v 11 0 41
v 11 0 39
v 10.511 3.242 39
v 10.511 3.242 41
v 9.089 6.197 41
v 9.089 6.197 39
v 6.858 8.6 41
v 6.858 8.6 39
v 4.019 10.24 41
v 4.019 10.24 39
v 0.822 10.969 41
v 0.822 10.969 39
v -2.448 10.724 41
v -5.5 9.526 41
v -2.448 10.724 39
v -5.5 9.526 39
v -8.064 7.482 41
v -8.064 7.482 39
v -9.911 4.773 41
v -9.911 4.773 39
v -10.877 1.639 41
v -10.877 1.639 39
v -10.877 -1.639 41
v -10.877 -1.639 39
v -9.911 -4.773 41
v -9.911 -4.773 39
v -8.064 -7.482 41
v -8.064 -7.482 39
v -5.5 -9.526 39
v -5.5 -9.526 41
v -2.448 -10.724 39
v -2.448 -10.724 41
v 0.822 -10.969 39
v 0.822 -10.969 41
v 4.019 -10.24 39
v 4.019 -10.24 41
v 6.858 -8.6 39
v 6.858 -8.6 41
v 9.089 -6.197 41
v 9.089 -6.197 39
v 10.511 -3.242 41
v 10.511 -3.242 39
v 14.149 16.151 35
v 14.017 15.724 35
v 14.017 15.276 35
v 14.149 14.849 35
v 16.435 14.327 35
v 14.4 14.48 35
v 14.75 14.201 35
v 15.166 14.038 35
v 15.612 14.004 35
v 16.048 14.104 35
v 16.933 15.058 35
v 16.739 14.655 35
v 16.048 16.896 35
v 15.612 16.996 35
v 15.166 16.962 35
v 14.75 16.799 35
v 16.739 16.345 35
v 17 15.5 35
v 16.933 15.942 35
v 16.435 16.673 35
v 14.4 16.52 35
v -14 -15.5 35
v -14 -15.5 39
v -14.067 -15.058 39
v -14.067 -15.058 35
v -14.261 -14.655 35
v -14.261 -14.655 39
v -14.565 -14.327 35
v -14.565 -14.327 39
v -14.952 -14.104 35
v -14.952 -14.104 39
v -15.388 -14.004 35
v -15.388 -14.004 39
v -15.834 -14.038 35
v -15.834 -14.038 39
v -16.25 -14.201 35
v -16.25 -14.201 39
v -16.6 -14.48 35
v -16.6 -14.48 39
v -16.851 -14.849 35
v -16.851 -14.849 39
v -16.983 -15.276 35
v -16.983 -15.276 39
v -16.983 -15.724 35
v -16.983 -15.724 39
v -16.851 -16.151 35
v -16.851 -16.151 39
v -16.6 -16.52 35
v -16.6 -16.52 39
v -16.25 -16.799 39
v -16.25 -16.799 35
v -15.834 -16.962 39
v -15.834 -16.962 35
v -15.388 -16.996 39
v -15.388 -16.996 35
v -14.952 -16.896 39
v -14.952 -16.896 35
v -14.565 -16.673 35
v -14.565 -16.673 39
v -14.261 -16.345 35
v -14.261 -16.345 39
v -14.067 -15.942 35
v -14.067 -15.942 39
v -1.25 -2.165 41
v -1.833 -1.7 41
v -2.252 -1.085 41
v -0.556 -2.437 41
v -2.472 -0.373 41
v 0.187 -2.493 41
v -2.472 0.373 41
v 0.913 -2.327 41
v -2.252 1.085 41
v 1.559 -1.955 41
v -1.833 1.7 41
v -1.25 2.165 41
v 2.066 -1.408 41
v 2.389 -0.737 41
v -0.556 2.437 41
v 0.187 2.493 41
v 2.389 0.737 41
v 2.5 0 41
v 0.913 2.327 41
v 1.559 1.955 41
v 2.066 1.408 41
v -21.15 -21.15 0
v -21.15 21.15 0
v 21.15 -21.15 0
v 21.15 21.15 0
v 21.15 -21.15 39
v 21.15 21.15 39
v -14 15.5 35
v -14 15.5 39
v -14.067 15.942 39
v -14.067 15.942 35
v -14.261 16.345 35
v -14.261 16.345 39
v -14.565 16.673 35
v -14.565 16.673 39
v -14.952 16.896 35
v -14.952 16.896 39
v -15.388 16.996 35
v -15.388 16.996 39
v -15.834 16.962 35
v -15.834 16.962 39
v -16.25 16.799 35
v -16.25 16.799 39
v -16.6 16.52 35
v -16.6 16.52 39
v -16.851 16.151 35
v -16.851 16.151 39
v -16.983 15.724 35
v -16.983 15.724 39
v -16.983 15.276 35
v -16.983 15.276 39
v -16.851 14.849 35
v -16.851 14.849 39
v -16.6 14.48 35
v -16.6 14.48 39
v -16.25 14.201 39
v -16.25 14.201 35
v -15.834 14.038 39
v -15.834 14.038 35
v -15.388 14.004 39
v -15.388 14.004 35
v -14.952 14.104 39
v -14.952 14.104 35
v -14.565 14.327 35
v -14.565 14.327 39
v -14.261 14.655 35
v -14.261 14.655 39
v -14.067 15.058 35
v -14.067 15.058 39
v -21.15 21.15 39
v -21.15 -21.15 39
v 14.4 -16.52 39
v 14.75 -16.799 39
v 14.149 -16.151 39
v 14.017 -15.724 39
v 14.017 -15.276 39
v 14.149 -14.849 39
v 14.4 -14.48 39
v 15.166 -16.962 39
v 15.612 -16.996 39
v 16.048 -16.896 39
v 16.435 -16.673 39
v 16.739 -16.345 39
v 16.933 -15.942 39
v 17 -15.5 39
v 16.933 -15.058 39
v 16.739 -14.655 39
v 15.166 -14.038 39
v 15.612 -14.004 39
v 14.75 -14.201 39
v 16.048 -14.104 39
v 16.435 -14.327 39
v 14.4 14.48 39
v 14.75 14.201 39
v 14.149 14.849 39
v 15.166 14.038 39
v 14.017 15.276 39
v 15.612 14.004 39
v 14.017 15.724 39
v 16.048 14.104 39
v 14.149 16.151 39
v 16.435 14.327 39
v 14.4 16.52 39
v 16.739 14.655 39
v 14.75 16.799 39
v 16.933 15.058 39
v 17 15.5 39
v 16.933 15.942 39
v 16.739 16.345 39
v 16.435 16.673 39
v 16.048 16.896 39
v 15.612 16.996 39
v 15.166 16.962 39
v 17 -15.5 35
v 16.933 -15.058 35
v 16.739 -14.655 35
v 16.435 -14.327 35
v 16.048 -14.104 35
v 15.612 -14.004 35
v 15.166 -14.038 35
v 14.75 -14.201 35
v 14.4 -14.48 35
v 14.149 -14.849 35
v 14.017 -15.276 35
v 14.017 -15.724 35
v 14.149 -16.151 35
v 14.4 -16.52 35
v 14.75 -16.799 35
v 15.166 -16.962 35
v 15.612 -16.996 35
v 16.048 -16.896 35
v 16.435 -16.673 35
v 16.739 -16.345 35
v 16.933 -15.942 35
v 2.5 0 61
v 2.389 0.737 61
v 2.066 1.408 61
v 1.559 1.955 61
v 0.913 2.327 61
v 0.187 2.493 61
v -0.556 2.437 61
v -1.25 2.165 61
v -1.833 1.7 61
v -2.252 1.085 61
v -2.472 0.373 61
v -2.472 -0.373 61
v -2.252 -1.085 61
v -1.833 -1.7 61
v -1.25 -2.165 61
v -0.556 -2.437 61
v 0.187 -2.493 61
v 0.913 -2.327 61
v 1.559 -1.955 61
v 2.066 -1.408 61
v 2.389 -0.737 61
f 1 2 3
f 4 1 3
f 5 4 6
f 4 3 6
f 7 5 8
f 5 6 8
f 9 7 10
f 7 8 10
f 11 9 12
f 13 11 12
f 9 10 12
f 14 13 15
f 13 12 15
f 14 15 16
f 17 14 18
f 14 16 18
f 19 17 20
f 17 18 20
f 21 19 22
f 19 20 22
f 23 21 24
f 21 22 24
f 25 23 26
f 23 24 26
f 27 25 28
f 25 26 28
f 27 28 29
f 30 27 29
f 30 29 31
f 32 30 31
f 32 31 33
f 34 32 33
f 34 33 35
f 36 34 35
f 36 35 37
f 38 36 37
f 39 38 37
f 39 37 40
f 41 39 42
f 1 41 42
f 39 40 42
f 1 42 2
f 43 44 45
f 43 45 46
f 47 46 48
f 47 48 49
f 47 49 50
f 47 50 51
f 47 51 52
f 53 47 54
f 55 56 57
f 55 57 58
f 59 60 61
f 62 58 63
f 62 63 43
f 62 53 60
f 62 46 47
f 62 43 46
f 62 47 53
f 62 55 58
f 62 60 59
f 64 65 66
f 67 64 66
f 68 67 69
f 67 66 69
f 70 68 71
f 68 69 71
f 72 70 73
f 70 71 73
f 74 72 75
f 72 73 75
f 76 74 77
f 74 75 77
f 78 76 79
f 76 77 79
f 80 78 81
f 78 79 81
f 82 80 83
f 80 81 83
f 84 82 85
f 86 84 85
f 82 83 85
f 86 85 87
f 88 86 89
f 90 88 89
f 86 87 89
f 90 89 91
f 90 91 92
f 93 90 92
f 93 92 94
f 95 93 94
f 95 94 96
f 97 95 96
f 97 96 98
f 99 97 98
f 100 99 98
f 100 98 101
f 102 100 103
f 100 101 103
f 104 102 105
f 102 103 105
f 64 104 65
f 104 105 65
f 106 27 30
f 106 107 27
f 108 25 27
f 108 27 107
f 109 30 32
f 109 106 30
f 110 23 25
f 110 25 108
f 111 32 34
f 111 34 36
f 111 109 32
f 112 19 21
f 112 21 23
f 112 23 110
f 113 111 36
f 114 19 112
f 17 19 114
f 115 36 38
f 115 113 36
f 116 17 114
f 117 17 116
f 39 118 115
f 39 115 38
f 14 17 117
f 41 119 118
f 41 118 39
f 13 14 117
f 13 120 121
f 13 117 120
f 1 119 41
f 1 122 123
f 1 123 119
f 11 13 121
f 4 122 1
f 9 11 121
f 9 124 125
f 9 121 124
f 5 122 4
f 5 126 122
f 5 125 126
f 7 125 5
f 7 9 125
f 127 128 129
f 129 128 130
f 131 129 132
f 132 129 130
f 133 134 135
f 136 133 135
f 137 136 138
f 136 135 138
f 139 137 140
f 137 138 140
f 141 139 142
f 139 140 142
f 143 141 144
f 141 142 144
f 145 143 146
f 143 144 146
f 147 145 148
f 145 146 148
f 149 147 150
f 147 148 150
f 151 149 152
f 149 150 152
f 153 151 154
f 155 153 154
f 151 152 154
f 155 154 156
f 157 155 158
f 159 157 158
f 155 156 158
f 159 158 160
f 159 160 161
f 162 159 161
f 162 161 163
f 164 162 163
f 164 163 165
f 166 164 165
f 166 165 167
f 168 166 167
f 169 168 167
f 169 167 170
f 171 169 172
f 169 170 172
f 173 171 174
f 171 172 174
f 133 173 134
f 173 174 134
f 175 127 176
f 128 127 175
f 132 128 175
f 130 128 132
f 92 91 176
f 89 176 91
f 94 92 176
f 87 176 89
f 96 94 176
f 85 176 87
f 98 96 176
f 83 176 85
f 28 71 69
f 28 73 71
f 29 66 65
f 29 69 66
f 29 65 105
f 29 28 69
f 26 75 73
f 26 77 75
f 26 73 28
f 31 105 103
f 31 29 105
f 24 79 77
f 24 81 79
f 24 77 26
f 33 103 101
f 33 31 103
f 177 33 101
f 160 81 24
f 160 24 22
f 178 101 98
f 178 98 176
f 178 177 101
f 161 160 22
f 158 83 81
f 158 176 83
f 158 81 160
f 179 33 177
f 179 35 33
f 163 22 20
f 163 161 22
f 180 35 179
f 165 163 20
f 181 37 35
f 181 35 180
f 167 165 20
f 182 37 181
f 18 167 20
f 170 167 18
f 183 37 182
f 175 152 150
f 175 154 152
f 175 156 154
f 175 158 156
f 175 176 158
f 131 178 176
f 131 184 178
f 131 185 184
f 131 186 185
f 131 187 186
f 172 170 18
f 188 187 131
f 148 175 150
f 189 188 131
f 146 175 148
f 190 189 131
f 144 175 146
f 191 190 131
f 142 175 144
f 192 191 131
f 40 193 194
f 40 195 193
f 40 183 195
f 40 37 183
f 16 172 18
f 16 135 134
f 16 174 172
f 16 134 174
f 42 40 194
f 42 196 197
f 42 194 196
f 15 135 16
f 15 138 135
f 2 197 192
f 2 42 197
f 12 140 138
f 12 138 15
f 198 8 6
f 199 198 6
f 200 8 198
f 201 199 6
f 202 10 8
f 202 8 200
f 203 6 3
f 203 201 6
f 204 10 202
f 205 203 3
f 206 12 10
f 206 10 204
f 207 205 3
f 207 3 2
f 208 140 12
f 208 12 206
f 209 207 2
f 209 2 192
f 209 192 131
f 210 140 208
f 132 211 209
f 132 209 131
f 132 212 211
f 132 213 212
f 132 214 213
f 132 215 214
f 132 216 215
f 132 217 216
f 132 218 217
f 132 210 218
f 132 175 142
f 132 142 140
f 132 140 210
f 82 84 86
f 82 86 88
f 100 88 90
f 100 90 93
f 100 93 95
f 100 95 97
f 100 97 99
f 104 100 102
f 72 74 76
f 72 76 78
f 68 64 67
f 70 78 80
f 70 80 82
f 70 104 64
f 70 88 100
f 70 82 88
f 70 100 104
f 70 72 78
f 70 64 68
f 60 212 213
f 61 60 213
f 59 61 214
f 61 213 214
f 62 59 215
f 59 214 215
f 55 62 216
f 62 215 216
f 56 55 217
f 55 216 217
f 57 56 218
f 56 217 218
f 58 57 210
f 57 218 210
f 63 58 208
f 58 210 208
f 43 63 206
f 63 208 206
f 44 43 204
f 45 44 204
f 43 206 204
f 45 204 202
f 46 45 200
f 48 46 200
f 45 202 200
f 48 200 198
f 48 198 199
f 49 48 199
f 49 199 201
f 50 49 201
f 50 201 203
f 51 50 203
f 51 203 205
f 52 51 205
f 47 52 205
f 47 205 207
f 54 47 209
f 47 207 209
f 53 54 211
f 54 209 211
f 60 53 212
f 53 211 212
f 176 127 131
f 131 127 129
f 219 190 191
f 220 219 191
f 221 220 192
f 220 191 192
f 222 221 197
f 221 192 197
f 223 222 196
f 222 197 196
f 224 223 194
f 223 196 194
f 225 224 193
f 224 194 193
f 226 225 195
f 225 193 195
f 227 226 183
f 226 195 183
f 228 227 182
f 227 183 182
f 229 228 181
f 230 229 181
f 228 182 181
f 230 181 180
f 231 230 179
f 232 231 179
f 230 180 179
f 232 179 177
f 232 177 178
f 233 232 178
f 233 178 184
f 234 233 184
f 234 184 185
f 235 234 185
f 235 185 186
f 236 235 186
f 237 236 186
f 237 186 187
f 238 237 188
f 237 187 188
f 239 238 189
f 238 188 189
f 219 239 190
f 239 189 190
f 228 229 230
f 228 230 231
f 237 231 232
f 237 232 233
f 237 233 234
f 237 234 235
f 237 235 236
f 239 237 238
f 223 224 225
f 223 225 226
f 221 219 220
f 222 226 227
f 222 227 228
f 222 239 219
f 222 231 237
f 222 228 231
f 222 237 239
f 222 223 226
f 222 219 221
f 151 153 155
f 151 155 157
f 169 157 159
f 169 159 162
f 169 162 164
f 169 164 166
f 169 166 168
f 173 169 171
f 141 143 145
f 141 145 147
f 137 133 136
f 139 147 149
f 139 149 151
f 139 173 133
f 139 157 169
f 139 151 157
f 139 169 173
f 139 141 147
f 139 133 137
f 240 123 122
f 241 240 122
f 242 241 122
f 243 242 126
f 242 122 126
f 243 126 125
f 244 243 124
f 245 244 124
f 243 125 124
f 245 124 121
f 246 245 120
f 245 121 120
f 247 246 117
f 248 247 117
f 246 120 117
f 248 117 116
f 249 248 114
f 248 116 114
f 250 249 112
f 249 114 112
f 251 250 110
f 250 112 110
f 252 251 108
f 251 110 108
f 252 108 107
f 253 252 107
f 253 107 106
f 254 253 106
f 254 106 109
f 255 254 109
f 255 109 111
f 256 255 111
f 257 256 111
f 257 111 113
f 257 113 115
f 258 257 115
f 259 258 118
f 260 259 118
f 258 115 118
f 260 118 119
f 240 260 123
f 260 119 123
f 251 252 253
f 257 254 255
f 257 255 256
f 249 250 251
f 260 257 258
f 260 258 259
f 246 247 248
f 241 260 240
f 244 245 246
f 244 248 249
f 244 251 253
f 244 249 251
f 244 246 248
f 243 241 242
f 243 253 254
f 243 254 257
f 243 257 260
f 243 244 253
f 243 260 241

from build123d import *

# Parameters (mm, degrees)
SKIZZE1_W                       = 42.3
SKIZZE1_H                       = 42.3
AUFSATZ_LINEAR_AUSTRAGEN1_DEPTH = 39
SKIZZE2_R                       = 11
AUFSATZ_LINEAR_AUSTRAGEN2_DEPTH = 2
SKIZZE3_R                       = 2.5
AUFSATZ_LINEAR_AUSTRAGEN3_DEPTH = 20
SKIZZE4_R                       = 1.5
SCHNITT_LINEAR_AUSTRAGEN1_DEPTH = 4


with BuildPart() as part:
    # Skizze1 → Aufsatz-Linear austragen1 (new body)
    with BuildSketch(Plane.XY):
        Rectangle(SKIZZE1_W, SKIZZE1_H)
    extrude(amount=AUFSATZ_LINEAR_AUSTRAGEN1_DEPTH)

    # Skizze2 → Aufsatz-Linear austragen2 (add)
    with BuildSketch(Plane.XY.offset(39)):
        Circle(SKIZZE2_R)
    extrude(amount=AUFSATZ_LINEAR_AUSTRAGEN2_DEPTH)

    # Skizze3 → Aufsatz-Linear austragen3 (add)
    with BuildSketch(Plane.XY.offset(41)):
        Circle(SKIZZE3_R)
    extrude(amount=AUFSATZ_LINEAR_AUSTRAGEN3_DEPTH)

    # Skizze4 → Schnitt-Linear austragen1 (cut)
    with BuildSketch(Plane.XY.offset(39)):
        with Locations((-15.5, 15.5)):
            Circle(SKIZZE4_R)
        with Locations((15.5, 15.5)):
            Circle(SKIZZE4_R)
        with Locations((15.5, -15.5)):
            Circle(SKIZZE4_R)
        with Locations((-15.5, -15.5)):
            Circle(SKIZZE4_R)
    extrude(amount=-SCHNITT_LINEAR_AUSTRAGEN1_DEPTH, mode=Mode.SUBTRACT)


solid = part.part
